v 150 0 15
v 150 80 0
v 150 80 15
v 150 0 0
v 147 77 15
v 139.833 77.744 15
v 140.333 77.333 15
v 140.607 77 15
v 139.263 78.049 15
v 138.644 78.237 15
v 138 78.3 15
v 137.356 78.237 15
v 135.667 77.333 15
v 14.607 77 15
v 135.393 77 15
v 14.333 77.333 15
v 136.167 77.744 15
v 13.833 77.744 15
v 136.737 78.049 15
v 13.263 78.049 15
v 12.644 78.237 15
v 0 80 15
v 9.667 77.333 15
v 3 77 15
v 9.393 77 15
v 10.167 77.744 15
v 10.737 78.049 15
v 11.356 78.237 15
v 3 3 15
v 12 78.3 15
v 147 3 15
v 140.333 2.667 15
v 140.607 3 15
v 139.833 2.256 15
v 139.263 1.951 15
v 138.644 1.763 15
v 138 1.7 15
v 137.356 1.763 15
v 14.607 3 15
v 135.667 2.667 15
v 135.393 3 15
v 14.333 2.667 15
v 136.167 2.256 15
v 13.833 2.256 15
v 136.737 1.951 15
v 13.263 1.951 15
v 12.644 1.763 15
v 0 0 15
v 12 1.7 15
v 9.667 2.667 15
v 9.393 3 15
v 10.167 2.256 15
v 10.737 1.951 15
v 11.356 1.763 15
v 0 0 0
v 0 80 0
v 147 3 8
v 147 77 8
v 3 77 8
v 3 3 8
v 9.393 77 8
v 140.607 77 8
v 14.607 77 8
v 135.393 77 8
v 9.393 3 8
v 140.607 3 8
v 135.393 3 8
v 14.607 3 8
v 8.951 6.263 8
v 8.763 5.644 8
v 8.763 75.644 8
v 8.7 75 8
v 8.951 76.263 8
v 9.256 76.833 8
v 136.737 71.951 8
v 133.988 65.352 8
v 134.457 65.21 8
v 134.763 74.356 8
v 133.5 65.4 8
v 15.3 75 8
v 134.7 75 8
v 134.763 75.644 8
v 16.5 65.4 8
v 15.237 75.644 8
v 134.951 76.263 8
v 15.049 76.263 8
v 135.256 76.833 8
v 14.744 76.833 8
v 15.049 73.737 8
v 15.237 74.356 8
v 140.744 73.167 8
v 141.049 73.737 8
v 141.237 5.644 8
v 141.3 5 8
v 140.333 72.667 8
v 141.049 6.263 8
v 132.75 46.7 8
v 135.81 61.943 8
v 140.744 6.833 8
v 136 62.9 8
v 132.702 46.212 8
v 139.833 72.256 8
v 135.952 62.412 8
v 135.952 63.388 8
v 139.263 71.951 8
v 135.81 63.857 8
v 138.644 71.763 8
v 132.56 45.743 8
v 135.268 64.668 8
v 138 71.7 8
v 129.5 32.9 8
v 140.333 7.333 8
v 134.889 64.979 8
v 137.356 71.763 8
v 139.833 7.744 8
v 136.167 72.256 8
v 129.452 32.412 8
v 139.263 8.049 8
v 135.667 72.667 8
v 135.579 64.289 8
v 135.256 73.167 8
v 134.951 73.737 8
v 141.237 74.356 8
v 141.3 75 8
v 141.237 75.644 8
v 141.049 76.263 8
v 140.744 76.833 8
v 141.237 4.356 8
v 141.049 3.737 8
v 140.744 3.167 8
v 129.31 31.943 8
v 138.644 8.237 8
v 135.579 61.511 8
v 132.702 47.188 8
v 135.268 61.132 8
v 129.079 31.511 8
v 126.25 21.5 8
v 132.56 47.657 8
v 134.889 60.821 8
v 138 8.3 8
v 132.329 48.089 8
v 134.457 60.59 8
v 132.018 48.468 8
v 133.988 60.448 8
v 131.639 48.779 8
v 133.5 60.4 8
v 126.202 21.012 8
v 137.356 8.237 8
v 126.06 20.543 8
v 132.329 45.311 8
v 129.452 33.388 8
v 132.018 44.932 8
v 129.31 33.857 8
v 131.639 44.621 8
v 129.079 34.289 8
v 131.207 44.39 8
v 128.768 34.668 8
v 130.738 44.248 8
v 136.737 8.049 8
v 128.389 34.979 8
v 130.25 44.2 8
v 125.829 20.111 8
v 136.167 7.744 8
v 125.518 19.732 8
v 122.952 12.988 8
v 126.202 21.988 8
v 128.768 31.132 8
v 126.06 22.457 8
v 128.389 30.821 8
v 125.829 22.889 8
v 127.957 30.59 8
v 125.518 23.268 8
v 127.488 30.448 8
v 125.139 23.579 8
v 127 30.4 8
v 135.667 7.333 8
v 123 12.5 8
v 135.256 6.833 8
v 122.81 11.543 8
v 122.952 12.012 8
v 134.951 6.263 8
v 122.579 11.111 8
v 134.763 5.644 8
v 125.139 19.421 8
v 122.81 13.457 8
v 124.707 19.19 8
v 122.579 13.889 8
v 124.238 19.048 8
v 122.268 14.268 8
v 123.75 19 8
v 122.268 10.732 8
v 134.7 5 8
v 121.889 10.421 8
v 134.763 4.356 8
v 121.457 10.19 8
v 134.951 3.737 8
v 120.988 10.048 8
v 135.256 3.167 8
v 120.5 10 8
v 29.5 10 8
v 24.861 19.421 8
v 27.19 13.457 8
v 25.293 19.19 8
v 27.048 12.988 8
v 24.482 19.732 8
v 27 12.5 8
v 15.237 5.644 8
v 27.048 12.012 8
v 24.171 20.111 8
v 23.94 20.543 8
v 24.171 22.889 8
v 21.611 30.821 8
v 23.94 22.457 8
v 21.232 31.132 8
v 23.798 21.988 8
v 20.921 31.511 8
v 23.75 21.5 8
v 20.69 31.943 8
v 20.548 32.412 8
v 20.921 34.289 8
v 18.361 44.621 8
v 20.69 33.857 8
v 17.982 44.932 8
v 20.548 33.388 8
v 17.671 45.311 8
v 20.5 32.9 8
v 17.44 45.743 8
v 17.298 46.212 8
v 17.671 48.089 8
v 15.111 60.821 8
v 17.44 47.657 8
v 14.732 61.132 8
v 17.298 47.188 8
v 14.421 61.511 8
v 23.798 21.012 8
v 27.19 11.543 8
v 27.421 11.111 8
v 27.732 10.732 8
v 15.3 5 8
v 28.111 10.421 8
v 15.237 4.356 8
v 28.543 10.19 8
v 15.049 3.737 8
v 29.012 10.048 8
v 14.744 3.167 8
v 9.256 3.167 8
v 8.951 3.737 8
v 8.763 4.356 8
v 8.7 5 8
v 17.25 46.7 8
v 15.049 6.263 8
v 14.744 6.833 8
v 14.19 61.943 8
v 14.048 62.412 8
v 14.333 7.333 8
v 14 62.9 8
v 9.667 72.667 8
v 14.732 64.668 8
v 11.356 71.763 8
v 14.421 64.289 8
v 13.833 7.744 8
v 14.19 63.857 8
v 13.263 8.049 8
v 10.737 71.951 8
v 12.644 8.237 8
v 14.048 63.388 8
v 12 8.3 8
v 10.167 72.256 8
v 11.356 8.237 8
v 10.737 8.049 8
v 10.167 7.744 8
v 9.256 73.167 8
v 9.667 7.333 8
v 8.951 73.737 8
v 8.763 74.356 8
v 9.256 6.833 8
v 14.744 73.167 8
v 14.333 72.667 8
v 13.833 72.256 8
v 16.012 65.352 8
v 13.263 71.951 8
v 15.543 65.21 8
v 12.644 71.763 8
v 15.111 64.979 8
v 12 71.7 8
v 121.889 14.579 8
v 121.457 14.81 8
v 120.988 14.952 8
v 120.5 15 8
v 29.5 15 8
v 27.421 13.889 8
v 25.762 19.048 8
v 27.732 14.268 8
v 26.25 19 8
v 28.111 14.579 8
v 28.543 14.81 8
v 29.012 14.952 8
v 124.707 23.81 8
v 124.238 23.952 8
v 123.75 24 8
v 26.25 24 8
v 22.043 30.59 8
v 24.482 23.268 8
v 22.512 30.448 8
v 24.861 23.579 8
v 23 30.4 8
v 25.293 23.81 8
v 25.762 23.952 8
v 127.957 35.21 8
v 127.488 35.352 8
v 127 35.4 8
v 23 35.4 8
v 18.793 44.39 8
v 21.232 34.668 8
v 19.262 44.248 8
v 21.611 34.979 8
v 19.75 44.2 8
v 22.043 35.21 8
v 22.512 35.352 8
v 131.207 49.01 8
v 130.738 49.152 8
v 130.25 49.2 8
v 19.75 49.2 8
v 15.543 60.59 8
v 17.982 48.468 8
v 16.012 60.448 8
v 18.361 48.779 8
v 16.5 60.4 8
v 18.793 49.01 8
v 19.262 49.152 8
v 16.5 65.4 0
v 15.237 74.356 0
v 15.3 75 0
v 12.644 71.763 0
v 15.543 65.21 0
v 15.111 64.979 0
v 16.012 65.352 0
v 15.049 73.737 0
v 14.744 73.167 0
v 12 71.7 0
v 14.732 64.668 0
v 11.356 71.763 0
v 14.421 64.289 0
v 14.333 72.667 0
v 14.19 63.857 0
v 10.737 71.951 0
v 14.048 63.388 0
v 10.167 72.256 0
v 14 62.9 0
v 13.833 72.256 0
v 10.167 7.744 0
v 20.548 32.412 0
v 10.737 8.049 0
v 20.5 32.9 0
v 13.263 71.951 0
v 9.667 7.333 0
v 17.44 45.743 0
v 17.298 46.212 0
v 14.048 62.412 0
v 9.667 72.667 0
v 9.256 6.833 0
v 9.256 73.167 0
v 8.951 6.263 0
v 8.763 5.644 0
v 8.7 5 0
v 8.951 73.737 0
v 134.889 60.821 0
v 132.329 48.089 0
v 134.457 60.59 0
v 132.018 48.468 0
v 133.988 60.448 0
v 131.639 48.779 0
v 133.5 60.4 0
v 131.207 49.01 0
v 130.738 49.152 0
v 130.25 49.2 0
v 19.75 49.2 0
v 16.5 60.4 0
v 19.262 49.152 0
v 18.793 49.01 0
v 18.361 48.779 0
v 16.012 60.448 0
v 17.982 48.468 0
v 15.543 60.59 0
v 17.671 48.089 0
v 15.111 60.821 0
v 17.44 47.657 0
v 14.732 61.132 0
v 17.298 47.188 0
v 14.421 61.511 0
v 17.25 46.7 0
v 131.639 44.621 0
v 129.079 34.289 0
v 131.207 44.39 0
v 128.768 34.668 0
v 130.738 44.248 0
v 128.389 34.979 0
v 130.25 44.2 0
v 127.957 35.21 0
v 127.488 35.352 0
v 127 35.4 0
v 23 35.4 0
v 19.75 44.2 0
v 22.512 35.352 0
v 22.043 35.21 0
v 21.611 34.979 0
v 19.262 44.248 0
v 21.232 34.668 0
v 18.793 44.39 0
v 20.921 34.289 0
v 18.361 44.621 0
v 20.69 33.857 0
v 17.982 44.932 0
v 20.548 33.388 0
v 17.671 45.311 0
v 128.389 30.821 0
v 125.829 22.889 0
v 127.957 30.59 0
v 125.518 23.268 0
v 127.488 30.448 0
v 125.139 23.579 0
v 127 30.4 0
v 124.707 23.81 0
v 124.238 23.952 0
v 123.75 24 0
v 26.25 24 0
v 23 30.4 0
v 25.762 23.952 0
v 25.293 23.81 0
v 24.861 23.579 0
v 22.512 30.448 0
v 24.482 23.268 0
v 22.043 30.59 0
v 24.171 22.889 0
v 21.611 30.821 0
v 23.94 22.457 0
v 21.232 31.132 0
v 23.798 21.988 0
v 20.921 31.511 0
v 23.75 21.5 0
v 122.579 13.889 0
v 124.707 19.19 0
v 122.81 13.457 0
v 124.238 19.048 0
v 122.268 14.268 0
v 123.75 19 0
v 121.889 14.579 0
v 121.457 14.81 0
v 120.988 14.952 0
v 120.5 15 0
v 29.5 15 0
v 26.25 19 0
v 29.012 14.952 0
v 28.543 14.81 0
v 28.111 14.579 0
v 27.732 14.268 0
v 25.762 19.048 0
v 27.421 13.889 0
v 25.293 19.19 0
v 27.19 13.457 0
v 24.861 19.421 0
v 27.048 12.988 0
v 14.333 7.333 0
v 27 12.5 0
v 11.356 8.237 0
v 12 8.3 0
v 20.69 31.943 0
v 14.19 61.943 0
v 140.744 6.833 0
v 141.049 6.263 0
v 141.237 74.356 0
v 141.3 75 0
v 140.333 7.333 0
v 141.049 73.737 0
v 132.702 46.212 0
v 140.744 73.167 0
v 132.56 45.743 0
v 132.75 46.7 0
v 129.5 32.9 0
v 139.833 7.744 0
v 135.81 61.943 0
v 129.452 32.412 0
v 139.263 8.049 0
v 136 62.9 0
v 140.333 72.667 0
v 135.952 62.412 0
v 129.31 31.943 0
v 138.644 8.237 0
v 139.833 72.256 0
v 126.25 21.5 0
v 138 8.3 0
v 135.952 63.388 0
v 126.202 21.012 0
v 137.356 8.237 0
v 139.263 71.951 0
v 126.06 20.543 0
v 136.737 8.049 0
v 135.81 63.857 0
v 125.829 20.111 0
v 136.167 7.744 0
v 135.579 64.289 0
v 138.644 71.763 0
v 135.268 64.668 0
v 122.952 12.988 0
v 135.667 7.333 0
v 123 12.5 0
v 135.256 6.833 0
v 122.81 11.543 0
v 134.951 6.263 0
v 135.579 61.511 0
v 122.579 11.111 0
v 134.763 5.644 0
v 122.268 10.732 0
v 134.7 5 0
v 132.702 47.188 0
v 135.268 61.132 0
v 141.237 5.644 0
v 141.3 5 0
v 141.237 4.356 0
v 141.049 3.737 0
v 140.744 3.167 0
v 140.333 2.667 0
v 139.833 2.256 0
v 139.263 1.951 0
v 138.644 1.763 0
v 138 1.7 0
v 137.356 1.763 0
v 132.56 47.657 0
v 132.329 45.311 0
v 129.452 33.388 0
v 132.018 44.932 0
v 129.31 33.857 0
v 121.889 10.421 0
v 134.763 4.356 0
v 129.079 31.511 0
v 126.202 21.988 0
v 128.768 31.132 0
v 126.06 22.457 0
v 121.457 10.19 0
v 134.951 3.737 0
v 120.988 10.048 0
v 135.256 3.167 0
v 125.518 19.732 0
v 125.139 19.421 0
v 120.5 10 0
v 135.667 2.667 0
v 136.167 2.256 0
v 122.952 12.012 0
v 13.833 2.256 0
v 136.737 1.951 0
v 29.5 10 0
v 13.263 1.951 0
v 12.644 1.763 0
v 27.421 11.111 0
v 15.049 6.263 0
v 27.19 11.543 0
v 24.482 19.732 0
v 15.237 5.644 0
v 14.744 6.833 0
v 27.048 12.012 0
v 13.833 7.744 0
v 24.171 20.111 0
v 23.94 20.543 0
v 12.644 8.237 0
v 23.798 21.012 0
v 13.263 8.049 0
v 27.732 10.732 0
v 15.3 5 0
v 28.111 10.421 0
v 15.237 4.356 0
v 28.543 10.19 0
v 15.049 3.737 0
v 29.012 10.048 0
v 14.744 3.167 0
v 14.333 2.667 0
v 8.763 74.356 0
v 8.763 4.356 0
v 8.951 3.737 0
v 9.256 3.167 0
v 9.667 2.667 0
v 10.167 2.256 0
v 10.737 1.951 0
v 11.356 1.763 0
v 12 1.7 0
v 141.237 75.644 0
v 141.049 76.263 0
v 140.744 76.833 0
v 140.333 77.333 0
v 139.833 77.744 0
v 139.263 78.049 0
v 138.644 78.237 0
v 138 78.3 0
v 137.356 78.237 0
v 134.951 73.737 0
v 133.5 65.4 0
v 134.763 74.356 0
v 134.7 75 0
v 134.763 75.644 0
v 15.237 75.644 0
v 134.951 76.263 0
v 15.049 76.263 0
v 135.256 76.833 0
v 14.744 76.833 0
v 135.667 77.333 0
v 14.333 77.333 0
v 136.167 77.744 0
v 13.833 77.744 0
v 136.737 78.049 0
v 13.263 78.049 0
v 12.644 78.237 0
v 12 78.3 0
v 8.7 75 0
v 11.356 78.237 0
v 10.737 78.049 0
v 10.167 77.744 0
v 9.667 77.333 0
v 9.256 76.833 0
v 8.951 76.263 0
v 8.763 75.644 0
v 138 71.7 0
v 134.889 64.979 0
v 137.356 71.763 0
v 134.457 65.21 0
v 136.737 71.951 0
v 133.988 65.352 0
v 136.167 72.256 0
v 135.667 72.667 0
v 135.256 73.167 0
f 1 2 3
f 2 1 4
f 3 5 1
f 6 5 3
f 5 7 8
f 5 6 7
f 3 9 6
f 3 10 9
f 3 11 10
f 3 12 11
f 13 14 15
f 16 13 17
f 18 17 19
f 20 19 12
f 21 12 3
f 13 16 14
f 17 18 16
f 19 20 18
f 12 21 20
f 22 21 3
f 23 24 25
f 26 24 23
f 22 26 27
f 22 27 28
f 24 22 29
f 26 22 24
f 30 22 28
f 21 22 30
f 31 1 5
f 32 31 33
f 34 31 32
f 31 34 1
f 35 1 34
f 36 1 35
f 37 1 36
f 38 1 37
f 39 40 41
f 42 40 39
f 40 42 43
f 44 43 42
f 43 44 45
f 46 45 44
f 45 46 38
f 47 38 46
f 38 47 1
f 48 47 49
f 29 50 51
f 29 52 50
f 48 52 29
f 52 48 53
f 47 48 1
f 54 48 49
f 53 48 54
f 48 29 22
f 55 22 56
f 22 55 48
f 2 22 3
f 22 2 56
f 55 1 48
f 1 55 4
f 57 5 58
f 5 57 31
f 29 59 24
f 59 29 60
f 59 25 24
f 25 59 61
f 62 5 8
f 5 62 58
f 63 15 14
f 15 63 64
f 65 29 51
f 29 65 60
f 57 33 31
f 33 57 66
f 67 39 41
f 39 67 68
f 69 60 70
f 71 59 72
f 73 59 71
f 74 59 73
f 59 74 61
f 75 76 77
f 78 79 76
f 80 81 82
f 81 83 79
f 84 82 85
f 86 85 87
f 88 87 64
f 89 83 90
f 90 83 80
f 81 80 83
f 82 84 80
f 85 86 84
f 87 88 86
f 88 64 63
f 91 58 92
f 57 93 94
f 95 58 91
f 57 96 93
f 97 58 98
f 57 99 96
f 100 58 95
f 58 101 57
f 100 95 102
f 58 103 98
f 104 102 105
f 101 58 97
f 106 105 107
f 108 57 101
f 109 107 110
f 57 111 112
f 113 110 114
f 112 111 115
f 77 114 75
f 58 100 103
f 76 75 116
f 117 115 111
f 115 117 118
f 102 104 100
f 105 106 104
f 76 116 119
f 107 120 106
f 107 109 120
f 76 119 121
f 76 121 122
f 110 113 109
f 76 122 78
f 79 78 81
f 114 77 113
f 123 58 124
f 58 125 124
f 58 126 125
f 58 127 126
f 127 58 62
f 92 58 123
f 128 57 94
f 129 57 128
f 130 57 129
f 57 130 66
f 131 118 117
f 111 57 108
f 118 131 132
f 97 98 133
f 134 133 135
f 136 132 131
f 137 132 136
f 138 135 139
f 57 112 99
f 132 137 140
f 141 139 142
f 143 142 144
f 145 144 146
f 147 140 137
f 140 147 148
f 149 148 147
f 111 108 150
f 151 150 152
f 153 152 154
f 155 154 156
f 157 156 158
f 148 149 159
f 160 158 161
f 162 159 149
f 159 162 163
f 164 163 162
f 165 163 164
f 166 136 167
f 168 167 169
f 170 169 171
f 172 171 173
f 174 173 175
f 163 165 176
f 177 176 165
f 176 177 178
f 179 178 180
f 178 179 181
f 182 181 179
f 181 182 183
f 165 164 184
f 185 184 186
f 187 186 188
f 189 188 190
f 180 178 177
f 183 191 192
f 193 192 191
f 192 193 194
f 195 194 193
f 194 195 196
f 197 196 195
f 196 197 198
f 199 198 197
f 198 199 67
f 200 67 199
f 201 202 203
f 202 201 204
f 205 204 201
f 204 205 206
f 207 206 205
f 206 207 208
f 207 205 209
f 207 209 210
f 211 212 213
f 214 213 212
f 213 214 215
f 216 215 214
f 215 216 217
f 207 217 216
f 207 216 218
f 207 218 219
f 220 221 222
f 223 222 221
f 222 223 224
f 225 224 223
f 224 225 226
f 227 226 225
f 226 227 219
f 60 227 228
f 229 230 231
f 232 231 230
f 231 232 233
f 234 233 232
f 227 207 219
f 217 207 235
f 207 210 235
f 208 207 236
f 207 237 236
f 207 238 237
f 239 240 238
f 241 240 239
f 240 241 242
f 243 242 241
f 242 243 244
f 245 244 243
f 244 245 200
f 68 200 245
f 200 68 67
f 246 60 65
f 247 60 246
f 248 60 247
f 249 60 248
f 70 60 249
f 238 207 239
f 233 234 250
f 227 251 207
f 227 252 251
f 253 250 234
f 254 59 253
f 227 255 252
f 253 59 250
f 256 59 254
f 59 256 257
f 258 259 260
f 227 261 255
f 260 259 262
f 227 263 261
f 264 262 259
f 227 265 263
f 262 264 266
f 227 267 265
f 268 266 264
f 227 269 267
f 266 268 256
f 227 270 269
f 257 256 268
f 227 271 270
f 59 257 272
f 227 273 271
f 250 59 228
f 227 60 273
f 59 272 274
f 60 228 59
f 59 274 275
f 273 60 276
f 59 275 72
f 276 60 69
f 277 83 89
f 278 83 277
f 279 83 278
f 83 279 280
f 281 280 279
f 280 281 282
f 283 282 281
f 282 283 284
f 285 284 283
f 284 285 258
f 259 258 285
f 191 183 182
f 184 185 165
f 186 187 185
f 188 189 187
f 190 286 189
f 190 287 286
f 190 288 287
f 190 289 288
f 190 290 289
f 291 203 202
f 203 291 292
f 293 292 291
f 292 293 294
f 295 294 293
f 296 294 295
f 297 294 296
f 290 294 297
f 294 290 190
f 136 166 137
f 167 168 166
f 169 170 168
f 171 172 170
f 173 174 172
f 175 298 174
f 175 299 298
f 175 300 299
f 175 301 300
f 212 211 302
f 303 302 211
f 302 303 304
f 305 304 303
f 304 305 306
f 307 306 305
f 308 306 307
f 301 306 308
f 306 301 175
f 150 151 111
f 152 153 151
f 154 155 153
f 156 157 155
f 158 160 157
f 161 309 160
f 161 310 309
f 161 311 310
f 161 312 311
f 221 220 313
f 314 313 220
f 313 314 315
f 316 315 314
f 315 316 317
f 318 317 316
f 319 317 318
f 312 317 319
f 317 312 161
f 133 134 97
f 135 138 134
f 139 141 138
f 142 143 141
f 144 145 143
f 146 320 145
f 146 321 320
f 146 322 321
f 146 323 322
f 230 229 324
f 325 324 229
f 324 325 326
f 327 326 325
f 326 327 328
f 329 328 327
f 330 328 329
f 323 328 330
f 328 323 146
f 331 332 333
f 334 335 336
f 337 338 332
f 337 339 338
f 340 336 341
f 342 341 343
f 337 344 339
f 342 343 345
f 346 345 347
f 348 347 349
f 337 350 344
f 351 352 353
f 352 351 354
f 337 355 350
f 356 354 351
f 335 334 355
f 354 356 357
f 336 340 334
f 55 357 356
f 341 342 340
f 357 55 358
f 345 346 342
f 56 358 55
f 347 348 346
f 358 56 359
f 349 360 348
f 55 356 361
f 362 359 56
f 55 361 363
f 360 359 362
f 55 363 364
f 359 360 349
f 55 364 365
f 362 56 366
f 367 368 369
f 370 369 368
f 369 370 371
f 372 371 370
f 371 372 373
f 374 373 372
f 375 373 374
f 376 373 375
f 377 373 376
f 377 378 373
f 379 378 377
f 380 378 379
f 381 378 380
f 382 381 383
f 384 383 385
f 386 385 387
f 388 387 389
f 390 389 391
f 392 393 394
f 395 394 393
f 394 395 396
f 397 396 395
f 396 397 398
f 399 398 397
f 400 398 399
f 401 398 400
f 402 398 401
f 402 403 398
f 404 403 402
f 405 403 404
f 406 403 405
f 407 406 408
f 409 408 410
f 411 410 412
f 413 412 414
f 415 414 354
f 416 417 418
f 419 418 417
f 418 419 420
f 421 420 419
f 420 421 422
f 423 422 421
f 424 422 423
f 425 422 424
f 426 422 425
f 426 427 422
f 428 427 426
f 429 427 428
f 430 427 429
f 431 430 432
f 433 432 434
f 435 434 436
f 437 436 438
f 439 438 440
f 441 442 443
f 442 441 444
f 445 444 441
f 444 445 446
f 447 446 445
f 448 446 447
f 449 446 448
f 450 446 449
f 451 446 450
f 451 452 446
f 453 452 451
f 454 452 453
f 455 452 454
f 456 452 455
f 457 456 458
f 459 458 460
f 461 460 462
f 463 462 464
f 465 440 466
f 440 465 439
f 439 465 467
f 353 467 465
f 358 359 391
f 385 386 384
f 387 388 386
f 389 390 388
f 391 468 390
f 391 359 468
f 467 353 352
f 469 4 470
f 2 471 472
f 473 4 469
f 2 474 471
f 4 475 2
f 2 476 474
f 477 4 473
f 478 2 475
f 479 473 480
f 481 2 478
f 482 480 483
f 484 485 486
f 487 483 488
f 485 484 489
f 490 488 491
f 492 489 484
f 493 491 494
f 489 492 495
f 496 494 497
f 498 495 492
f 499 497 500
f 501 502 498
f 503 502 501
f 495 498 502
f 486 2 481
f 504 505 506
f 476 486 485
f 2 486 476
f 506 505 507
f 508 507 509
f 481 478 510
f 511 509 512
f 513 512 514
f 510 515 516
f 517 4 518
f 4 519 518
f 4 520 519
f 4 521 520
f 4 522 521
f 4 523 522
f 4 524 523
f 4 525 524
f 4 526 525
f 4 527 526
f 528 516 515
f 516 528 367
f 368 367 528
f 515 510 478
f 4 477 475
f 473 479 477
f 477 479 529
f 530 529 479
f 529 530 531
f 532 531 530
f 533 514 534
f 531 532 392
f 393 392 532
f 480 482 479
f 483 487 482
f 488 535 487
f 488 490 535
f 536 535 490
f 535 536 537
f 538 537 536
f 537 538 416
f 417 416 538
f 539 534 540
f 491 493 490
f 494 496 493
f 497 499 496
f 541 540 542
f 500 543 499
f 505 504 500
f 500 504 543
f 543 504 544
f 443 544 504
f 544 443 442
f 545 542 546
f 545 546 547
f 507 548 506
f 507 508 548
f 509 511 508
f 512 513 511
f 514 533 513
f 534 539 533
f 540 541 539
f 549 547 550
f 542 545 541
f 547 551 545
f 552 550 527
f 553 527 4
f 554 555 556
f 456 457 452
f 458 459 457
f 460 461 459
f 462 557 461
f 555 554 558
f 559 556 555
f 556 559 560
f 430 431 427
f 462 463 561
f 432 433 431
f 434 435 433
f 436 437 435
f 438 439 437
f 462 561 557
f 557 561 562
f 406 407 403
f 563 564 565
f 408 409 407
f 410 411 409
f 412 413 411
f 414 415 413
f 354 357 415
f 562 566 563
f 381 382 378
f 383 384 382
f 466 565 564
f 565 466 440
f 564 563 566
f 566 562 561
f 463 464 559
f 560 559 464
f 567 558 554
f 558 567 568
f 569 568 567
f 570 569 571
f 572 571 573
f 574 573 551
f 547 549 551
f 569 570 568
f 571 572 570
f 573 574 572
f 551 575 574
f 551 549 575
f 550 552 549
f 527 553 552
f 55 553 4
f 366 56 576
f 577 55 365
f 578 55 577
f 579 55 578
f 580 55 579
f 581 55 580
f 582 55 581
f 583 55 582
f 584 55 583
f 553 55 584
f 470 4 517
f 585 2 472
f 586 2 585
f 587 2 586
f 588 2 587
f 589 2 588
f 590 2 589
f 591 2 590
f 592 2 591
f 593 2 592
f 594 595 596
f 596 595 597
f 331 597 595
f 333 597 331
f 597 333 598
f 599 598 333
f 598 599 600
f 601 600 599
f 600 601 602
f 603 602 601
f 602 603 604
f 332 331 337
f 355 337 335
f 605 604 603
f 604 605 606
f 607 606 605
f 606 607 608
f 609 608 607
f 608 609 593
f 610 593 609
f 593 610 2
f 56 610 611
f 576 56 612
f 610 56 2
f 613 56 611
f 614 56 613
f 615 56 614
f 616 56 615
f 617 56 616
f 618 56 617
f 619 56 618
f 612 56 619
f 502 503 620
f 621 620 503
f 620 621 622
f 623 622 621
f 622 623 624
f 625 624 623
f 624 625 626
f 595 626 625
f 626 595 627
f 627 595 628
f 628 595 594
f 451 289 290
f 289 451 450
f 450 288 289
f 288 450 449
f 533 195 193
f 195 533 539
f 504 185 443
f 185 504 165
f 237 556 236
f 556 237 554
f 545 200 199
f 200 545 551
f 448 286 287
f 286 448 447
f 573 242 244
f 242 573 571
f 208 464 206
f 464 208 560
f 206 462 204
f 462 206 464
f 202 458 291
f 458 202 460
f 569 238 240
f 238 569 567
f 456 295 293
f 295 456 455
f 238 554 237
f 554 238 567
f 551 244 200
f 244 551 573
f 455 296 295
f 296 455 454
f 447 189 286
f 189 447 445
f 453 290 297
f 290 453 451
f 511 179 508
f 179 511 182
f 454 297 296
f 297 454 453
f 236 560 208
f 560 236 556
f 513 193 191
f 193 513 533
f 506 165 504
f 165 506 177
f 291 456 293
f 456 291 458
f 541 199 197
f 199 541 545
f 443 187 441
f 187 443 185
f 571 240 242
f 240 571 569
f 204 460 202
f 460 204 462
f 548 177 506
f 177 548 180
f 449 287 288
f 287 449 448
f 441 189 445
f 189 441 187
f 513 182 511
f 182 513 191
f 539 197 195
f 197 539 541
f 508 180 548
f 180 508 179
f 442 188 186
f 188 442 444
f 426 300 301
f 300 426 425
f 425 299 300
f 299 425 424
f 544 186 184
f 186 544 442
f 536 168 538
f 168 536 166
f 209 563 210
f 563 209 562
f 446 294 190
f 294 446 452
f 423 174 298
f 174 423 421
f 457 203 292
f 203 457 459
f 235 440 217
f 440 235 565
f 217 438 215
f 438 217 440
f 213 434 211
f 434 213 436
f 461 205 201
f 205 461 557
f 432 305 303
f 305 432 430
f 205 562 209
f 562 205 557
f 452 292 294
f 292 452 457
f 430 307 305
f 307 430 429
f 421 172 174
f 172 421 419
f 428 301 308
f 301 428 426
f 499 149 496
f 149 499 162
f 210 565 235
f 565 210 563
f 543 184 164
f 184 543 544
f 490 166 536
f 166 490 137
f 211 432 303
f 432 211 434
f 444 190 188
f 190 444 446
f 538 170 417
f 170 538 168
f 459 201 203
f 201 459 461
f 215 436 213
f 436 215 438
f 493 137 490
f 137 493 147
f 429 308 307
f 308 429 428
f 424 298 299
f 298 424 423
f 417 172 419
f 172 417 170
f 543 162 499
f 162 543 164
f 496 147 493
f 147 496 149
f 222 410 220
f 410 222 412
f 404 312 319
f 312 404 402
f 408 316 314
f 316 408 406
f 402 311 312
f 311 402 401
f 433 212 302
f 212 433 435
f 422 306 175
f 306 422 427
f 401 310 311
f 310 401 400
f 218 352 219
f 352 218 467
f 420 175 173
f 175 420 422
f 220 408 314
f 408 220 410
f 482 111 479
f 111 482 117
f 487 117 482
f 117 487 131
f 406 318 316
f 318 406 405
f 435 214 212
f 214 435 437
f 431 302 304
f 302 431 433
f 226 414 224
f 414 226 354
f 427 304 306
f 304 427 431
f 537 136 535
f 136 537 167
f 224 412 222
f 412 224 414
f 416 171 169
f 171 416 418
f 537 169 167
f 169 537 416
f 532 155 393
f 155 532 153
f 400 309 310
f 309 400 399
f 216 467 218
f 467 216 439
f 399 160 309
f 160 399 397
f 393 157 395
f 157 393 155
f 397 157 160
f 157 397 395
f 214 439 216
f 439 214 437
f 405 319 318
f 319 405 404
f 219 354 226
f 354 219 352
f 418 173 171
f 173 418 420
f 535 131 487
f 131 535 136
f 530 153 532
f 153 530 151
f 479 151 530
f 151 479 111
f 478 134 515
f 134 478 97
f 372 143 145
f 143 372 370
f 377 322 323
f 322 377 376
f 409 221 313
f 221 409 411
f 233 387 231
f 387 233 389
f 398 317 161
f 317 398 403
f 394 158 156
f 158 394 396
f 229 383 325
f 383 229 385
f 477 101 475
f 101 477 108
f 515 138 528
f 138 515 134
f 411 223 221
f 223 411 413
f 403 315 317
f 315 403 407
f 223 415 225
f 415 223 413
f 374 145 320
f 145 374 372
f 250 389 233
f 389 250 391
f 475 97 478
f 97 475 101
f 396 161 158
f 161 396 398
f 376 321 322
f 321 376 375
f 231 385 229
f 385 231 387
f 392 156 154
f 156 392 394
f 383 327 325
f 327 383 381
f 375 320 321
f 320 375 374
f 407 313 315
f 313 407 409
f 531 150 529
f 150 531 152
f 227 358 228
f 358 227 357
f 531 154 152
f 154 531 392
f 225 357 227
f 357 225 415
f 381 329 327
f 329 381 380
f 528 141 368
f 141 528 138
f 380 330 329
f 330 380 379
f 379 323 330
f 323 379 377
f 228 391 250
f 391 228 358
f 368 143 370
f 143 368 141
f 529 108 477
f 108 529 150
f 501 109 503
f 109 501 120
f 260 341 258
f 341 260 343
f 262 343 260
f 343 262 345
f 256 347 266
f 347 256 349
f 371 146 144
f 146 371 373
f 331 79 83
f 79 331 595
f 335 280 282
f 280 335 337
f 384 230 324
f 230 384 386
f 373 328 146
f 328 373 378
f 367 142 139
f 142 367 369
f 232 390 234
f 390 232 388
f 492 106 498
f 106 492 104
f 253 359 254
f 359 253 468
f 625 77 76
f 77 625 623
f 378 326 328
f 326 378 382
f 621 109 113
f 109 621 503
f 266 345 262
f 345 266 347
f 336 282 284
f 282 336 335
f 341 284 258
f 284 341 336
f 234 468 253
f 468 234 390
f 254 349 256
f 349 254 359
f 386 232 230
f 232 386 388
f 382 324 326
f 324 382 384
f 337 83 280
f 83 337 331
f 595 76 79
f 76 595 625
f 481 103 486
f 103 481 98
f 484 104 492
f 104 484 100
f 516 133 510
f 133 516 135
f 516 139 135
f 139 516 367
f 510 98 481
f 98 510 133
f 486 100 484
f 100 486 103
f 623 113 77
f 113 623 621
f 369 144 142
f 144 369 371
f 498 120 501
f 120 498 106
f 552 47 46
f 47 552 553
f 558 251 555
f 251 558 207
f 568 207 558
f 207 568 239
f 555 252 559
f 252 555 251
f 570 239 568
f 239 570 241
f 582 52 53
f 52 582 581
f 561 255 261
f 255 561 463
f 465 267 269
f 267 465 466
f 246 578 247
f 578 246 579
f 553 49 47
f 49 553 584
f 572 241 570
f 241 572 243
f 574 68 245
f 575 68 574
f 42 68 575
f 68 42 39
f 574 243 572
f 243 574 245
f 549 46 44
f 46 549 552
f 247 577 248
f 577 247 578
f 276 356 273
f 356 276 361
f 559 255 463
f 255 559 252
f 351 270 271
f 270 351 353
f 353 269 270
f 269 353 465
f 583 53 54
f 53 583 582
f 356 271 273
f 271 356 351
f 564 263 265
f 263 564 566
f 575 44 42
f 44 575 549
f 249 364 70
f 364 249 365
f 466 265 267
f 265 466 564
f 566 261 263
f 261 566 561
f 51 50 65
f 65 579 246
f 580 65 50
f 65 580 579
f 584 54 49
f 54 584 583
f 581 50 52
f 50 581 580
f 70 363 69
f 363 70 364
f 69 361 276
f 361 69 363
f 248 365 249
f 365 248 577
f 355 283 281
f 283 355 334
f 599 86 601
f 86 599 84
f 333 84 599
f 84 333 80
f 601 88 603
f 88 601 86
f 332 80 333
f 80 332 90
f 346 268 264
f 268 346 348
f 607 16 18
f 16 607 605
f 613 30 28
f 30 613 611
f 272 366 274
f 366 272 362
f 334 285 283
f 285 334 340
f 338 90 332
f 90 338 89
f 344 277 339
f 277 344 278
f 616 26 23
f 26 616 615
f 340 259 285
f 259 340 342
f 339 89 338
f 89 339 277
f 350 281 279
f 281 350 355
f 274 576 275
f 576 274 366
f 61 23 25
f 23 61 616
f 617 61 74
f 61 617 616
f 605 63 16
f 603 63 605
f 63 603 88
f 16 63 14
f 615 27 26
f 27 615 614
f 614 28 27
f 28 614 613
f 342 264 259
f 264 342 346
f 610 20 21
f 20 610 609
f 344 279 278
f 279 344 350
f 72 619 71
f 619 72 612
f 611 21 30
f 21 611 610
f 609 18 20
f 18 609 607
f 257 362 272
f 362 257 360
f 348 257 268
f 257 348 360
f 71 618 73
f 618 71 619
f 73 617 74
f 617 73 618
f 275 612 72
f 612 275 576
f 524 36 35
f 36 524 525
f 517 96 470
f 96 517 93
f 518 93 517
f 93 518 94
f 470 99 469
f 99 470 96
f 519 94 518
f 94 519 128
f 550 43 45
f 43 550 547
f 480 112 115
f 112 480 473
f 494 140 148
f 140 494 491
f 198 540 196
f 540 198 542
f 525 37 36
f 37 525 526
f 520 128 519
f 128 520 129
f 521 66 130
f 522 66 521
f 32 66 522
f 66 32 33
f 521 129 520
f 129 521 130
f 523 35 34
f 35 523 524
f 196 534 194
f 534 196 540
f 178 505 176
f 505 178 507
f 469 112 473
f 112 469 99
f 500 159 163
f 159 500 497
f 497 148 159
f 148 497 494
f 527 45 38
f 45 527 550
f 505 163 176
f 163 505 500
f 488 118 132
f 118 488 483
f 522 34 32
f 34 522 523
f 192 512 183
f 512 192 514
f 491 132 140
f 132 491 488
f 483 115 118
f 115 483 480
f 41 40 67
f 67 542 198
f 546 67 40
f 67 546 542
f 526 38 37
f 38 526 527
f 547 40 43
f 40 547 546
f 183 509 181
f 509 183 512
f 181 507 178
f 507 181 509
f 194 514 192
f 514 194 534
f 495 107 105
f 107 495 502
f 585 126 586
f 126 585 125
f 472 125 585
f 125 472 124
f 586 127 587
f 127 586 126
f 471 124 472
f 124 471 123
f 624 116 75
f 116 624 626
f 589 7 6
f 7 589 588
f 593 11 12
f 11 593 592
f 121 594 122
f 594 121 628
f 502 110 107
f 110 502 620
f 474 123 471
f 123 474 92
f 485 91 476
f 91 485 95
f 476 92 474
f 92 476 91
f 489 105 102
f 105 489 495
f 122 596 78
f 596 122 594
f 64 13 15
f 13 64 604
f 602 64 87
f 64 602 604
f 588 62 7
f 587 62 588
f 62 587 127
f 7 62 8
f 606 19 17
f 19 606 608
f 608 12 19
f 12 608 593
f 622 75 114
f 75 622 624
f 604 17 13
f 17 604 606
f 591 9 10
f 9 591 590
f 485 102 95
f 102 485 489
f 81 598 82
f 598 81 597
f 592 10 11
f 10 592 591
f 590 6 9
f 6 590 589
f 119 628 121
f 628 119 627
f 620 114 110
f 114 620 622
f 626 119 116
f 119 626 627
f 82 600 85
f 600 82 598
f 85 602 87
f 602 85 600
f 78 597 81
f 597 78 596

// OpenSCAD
$fn = 32;

// ----------------------------------------------------------------------
// Slotted panel: 150 x 80 mm, 5 рядов of slots
// ----------------------------------------------------------------------

// --- parameters (mm) ---
panel_w = 150;            // panel width
panel_d = 80;             // panel depth
thick = 8;                // panel thickness
slot_w = 5;               // slot width
pitch0 = 9;               // first row pitch
pitch_step = 2.4;         // pitch increase per row
margin = 10;              // margin around the slot field
rows = 5;                 // number of slot rows
mount_d = 6.6;            // mounting holes
mount_x = 63;             // mounting hole offset
rim_h = 15;               // rim height
rim_t = 3;                // rim wall thickness

difference() {
  union() {
    cube([panel_w, panel_d, thick]);
    translate([0, 0, thick - 1]) difference() {
      cube([panel_w, panel_d, rim_h - thick + 1]);
      translate([rim_t, rim_t, -2.5]) cube([panel_w - 2 * rim_t, panel_d - 2 * rim_t, rim_h - thick + 6]);
    }
  }
  /* slot rows: stadium shaped cutters, 2.5 mm clear of both faces */
  /* row 0: pitch 9, length 91 */
  hull() {
    translate([29.5, 12.5, -2.5]) cylinder(h = thick + 5, d = slot_w);
    translate([120.5, 12.5, -2.5]) cylinder(h = thick + 5, d = slot_w);
  }
  /* row 1: pitch 11.4, length 97.5 */
  hull() {
    translate([26.25, 21.5, -2.5]) cylinder(h = thick + 5, d = slot_w);
    translate([123.75, 21.5, -2.5]) cylinder(h = thick + 5, d = slot_w);
  }
  /* row 2: pitch 13.8, length 104 */
  hull() {
    translate([23, 32.9, -2.5]) cylinder(h = thick + 5, d = slot_w);
    translate([127, 32.9, -2.5]) cylinder(h = thick + 5, d = slot_w);
  }
  /* row 3: pitch 16.2, length 110.5 */
  hull() {
    translate([19.75, 46.7, -2.5]) cylinder(h = thick + 5, d = slot_w);
    translate([130.25, 46.7, -2.5]) cylinder(h = thick + 5, d = slot_w);
  }
  /* row 4: pitch 18.6, length 117 */
  hull() {
    translate([16.5, 62.9, -2.5]) cylinder(h = thick + 5, d = slot_w);
    translate([133.5, 62.9, -2.5]) cylinder(h = thick + 5, d = slot_w);
  }
  translate([12, 5, -2.5]) cylinder(h = 20, d = mount_d);
  translate([12, 75, -2.5]) cylinder(h = 20, d = mount_d);
  translate([138, 5, -2.5]) cylinder(h = 20, d = mount_d);
  translate([138, 75, -2.5]) cylinder(h = 20, d = mount_d);
}
